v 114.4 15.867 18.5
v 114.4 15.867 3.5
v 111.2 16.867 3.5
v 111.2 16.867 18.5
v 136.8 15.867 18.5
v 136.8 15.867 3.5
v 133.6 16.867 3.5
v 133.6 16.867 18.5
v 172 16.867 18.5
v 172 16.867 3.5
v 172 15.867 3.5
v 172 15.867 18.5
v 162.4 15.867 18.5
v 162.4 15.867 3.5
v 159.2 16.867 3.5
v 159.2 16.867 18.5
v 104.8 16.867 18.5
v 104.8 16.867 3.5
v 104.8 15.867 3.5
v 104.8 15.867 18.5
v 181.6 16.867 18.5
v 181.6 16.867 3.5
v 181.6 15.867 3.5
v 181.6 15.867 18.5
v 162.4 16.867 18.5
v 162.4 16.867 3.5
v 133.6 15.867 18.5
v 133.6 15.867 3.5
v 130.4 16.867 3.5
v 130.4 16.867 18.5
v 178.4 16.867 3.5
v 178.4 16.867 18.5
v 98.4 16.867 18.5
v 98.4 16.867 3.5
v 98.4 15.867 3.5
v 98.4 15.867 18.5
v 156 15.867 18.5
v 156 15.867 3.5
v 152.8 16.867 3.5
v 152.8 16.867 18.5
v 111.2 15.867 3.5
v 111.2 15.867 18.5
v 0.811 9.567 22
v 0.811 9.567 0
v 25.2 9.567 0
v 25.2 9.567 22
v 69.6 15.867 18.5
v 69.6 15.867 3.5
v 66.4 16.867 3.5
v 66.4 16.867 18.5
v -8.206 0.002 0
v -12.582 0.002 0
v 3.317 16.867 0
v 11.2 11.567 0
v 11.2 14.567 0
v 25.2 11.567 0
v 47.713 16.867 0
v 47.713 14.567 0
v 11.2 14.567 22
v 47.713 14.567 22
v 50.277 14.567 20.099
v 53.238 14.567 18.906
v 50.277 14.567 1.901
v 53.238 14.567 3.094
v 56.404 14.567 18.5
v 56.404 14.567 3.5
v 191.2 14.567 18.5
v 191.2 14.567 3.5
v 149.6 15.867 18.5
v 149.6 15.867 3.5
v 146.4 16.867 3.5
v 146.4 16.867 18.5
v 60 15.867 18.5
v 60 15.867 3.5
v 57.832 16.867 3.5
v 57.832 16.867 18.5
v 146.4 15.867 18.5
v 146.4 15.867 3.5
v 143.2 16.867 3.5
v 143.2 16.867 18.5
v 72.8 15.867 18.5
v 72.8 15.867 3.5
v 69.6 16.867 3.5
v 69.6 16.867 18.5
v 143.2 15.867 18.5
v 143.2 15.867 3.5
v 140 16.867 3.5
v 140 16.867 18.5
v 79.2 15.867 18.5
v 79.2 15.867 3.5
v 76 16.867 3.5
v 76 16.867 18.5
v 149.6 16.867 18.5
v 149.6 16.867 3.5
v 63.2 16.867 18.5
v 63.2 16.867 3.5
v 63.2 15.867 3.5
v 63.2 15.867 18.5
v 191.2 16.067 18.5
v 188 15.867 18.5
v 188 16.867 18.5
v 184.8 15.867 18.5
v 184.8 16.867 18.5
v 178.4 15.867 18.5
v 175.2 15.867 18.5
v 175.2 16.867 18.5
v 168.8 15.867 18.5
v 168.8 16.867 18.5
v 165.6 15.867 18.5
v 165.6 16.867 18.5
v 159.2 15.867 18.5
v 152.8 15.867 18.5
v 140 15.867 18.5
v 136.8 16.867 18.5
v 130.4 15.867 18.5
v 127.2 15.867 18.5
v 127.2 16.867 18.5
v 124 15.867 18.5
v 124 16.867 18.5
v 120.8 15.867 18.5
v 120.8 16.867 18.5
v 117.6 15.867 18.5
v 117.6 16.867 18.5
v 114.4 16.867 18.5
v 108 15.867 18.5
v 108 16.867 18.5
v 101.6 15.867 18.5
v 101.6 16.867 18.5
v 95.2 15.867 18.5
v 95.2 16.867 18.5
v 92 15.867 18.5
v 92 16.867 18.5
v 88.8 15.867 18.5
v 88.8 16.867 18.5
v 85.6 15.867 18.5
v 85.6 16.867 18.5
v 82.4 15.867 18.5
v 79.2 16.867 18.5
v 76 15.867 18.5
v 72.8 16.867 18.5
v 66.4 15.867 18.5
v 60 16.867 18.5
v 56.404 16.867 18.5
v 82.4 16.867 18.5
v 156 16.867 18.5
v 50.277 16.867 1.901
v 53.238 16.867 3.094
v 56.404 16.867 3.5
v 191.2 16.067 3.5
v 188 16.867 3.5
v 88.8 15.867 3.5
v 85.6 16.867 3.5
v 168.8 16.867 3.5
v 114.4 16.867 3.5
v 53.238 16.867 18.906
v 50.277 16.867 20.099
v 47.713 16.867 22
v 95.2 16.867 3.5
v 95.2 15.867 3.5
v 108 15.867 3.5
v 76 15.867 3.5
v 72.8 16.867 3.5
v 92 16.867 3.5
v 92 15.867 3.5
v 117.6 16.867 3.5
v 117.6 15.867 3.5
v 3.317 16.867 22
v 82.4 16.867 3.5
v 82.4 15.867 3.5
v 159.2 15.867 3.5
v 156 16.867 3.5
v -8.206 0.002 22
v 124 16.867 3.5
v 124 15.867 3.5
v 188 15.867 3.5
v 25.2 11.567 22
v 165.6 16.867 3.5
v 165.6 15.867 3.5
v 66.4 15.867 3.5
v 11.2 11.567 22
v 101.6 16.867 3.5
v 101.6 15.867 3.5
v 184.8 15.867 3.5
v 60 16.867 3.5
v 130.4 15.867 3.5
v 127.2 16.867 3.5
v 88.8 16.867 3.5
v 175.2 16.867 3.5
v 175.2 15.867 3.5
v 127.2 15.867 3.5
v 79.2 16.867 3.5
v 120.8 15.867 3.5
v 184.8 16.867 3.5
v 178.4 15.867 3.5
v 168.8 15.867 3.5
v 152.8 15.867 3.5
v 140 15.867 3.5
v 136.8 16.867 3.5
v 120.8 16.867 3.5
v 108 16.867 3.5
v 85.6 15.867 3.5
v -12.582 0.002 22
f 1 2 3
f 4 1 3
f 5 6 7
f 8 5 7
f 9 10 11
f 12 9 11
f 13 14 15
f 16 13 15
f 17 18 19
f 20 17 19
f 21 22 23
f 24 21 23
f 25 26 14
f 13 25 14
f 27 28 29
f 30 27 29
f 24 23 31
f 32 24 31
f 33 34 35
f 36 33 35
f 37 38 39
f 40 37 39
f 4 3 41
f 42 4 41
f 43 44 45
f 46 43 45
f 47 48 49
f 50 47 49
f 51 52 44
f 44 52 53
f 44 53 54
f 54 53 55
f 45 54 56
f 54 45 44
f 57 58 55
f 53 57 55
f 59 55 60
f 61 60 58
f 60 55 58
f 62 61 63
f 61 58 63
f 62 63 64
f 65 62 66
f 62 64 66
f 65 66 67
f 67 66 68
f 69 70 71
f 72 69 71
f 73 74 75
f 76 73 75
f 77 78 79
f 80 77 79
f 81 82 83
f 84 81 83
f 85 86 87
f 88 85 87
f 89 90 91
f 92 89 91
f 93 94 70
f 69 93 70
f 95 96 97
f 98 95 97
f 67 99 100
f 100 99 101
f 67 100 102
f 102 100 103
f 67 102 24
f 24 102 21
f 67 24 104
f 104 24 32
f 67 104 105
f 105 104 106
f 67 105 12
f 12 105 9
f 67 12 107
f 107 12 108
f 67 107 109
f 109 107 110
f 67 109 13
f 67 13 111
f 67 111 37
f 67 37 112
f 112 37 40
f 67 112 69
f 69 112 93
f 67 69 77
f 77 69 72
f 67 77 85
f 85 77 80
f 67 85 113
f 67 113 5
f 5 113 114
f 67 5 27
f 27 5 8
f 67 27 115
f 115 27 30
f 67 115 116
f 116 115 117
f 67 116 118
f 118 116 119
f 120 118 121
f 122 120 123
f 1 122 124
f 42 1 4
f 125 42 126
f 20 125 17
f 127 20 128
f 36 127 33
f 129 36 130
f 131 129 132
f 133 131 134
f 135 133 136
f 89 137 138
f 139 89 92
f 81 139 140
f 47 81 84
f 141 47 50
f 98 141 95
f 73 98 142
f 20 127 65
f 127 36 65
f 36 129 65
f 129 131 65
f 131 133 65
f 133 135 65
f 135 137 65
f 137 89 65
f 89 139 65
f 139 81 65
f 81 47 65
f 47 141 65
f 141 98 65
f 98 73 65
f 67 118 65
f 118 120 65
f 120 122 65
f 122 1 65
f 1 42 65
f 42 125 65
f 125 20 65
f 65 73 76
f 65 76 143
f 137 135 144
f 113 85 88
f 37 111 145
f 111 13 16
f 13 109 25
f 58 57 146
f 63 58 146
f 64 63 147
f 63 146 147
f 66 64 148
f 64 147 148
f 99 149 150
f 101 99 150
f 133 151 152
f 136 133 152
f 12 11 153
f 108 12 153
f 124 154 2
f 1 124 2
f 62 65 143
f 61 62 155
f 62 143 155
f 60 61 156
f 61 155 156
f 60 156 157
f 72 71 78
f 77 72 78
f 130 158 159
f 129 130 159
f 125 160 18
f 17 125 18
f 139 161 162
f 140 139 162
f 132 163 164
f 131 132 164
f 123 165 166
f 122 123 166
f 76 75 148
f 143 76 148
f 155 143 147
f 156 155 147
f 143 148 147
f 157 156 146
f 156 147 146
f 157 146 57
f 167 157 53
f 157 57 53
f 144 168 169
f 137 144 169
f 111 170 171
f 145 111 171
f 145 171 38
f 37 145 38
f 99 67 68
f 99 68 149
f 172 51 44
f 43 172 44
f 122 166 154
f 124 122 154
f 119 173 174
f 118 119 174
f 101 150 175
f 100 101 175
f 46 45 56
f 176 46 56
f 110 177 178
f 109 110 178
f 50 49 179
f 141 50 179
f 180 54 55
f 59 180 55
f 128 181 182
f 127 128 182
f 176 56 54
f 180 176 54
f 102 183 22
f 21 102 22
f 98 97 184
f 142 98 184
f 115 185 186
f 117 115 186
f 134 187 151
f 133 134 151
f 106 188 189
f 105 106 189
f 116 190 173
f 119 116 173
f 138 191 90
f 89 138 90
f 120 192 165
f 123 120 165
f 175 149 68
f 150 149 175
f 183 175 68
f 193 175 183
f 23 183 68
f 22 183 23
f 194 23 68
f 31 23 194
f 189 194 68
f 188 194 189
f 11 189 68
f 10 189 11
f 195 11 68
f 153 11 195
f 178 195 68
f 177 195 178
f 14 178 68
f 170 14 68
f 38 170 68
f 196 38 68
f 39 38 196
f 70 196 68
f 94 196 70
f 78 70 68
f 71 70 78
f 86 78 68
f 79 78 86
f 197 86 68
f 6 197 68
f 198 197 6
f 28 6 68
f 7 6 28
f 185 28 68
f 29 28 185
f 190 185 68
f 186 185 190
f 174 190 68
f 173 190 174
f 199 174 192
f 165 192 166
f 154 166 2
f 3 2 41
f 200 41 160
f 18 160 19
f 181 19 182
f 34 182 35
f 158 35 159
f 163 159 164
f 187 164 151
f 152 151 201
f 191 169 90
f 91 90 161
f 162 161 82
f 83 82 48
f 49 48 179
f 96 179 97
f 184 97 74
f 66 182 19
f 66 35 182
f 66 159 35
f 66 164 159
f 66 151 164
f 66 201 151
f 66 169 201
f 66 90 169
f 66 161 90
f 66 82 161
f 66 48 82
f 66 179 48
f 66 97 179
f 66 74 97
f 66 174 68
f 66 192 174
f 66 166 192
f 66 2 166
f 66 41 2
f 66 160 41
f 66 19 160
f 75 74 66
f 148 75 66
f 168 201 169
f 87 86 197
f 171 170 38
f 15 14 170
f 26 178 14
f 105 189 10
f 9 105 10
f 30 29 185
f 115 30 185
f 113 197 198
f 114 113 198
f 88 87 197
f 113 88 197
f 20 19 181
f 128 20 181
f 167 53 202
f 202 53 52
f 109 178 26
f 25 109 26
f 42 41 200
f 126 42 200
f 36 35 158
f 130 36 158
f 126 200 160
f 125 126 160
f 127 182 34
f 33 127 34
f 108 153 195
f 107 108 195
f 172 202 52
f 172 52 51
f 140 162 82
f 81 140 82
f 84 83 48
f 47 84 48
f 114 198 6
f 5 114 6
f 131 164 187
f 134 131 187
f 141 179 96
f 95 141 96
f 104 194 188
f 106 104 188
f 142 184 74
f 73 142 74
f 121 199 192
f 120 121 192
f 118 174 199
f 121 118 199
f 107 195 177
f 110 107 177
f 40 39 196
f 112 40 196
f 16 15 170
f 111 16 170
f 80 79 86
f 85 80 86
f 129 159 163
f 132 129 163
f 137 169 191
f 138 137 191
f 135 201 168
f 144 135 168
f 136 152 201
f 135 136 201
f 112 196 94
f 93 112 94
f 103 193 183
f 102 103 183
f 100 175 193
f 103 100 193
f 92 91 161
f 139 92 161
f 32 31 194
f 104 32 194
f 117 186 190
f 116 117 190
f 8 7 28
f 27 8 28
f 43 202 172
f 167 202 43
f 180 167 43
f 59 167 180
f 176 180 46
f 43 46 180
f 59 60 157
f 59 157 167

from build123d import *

# Parameters (mm, degrees)
PAD_DEPTH    = 22
POCKET_DEPTH = 20


with BuildPart() as part:
    # Sketch → Pad (new body)
    with BuildSketch(Plane.XY):
        Polygon((0.810902, 9.567203), (25.199765, 9.567203), (25.199765, 11.567203), (11.199765, 11.567203), (11.199765, 14.567203), (191.199765, 14.567203), (191.199765, 16.067203), (187.999779, 16.867203), (187.999779, 15.867203), (184.799779, 16.867203), (184.799779, 15.867203), (181.599779, 16.867203), (181.599779, 15.867203), (178.399779, 16.867203), (178.399779, 15.867203), (175.199779, 16.867203), (175.199779, 15.867203), (171.999779, 16.867203), (171.999779, 15.867203), (168.799779, 16.867203), (168.799779, 15.867203), (165.599779, 16.867203), (165.599779, 15.867203), (162.399779, 16.867203), (162.399779, 15.867203), (159.199779, 16.867203), (159.199779, 15.867203), (155.999779, 16.867203), (155.999779, 15.867203), (152.799779, 16.867203), (152.799779, 15.867203), (149.599779, 16.867203), (149.599779, 15.867203), (146.399779, 16.867203), (146.399779, 15.867203), (143.199779, 16.867203), (143.199779, 15.867203), (139.999779, 16.867203), (139.999779, 15.867203), (136.799779, 16.867203), (136.799779, 15.867203), (133.599779, 16.867203), (133.599779, 15.867203), (130.399779, 16.867203), (130.399779, 15.867203), (127.199779, 16.867203), (127.199779, 15.867203), (123.999779, 16.867203), (123.999779, 15.867203), (120.799779, 16.867203), (120.799779, 15.867203), (117.599779, 16.867203), (117.599779, 15.867203), (114.399779, 16.867203), (114.399779, 15.867203), (111.199779, 16.867203), (111.199779, 15.867203), (107.999779, 16.867203), (107.999779, 15.867203), (104.799779, 16.867203), (104.799779, 15.867203), (101.599779, 16.867203), (101.599779, 15.867203), (98.399779, 16.867203), (98.399779, 15.867203), (95.199779, 16.867203), (95.199779, 15.867203), (91.999779, 16.867203), (91.999779, 15.867203), (88.799779, 16.867203), (88.799779, 15.867203), (85.599779, 16.867203), (85.599779, 15.867203), (82.399779, 16.867203), (82.399779, 15.867203), (79.199779, 16.867203), (79.199779, 15.867203), (75.999779, 16.867203), (75.999779, 15.867203), (72.799779, 16.867203), (72.799779, 15.867203), (69.599779, 16.867203), (69.599779, 15.867203), (66.399779, 16.867203), (66.399779, 15.867203), (63.199779, 16.867203), (63.199779, 15.867203), (59.999772, 16.867203), (59.999772, 15.867203), (57.832203, 16.867203), (3.316658, 16.867203), (-12.582002, 0.001582), (-8.206291, 0.001582), align=None)
    extrude(amount=PAD_DEPTH)

    # Sketch001 (on Face91 of Pad) → Pocket (cut)
    with BuildSketch(Plane(origin=(0, 16.867203, 0), x_dir=(-1, 0, 0), z_dir=(0, 1, 0))):
        with BuildLine():
            ThreePointArc((-197.532818, 43.580935), (-210.073285, 31.040467), (-197.532818, 18.5))
            Line((-197.532818, 18.5), (-56.404323, 18.5))
            ThreePointArc((-56.404323, 18.5), (-43.863855, 31.040467), (-56.404323, 43.580935))
            Line((-197.532818, 43.580935), (-56.404323, 43.580935))
        make_face()
        with BuildLine():
            ThreePointArc((-197.532818, 3.5), (-210.073285, -9.040467), (-197.532818, -21.580935))
            Line((-197.532818, -21.580935), (-56.404323, -21.580935))
            ThreePointArc((-56.404323, -21.580935), (-43.863855, -9.040467), (-56.404323, 3.5))
            Line((-197.532818, 3.5), (-56.404323, 3.5))
        make_face()
    extrude(amount=-POCKET_DEPTH, mode=Mode.SUBTRACT)


solid = part.part
